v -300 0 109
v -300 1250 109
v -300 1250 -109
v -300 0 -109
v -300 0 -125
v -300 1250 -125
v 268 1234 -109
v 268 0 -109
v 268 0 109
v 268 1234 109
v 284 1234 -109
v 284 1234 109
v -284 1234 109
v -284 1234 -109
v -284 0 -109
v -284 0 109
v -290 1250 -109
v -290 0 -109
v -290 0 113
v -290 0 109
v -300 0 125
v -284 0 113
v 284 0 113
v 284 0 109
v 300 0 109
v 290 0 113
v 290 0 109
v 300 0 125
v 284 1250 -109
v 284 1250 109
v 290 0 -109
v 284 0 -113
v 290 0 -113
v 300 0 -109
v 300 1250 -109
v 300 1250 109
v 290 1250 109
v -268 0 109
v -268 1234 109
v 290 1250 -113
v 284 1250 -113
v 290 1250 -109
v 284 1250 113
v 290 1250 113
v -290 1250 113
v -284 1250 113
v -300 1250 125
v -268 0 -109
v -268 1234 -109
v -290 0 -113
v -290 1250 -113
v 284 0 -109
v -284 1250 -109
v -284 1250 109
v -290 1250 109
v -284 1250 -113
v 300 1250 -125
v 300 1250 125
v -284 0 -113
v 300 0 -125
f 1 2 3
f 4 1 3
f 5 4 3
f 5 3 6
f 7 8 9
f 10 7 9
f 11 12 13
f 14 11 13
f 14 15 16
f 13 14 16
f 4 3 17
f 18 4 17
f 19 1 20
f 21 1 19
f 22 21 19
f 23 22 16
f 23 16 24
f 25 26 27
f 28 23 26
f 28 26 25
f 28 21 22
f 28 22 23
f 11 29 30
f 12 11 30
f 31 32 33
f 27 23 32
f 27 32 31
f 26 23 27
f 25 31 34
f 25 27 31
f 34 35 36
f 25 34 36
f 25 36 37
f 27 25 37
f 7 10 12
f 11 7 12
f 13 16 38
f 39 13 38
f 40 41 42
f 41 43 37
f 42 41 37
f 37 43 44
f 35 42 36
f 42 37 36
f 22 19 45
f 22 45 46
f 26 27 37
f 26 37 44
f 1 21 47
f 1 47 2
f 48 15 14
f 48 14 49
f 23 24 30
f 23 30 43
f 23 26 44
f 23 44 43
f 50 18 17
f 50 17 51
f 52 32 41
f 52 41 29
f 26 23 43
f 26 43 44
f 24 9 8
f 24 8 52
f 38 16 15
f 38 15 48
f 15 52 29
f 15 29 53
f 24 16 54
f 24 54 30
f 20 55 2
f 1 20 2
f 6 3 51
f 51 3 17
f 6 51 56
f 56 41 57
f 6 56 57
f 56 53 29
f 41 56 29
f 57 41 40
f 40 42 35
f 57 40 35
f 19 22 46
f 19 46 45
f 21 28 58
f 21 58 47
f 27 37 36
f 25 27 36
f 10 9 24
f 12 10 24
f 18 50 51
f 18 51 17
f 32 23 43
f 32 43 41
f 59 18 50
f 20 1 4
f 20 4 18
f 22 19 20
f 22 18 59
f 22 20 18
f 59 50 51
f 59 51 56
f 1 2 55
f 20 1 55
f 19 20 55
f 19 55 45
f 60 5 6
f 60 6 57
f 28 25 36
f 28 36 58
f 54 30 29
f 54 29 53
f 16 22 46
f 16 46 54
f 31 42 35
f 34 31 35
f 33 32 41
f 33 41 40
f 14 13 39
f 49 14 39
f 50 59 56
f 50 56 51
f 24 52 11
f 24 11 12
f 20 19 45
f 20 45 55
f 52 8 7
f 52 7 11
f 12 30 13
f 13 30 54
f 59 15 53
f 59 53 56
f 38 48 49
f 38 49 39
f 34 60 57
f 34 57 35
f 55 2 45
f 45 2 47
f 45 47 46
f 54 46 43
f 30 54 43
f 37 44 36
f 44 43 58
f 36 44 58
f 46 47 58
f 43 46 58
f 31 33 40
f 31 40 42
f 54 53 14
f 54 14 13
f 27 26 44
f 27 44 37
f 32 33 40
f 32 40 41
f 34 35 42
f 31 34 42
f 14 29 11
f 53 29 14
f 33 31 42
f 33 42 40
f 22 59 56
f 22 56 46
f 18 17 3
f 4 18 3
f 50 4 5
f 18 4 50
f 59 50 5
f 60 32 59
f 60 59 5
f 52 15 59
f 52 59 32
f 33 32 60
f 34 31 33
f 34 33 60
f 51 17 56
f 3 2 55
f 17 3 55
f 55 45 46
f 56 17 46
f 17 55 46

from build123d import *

# Parameters (mm, degrees)
F1_DEPTH = 1250
F2_DEPTH = 1250
F3_DEPTH = 1250
F4_DEPTH = 1250
F0_W     = 16
F0_H     = 218
F5_DEPTH = 1234
F6_DEPTH = 1234
F8_W     = 568
F8_H     = 218
F9_DEPTH = 16


with BuildPart() as f1:
    # F0 (on Front) → F1 (new body)
    with BuildSketch(Plane.XZ):
        Polygon((290, -109), (300, -109), (300, 109), (290, 109), (290, 113), (284, 113), (284, 109), (284, -109), (284, -113), (290, -113), align=None)
    extrude(amount=-F1_DEPTH)


with BuildPart() as f2:
    # F0 (on Front) → F2 (new body)
    with BuildSketch(Plane.XZ):
        Polygon((290, 109), (300, 109), (300, 125), (-300, 125), (-300, 109), (-290, 109), (-290, 113), (-284, 113), (-284, 109), (-268, 109), (268, 109), (284, 109), (284, 113), (290, 113), align=None)
    extrude(amount=-F2_DEPTH)


with BuildPart() as f3:
    # F0 (on Front) → F3 (new body)
    with BuildSketch(Plane.XZ):
        Polygon((-300, 109), (-300, -109), (-290, -109), (-290, -113), (-284, -113), (-284, -109), (-284, 109), (-284, 113), (-290, 113), (-290, 109), align=None)
    extrude(amount=-F3_DEPTH)


with BuildPart() as f4:
    # F0 (on Front) → F4 (new body)
    with BuildSketch(Plane.XZ):
        Polygon((-300, -125), (300, -125), (300, -109), (290, -109), (290, -113), (284, -113), (284, -109), (268, -109), (-268, -109), (-284, -109), (-284, -113), (-290, -113), (-290, -109), (-300, -109), align=None)
    extrude(amount=-F4_DEPTH)


with BuildPart() as f5:
    # F0 (on Front) → F5 (new body)
    with BuildSketch(Plane.XZ):
        with Locations((276, 0)):
            Rectangle(F0_W, F0_H)
    extrude(amount=-F5_DEPTH)


with BuildPart() as f6:
    # F0 (on Front) → F6 (new body)
    with BuildSketch(Plane.XZ):
        with Locations((-276, 0)):
            Rectangle(F0_W, F0_H)
    extrude(amount=-F6_DEPTH)


with BuildPart() as f9:
    # F8 (on face) → F9 (new body)
    with BuildSketch(Plane(origin=(0, 1250, 0), x_dir=(-1, 0, 0), z_dir=(0, 1, 0))):
        Rectangle(F8_W, F8_H)
    extrude(amount=-F9_DEPTH)


solid = Compound([f1.part, f2.part, f3.part, f4.part, f5.part, f6.part, f9.part])
